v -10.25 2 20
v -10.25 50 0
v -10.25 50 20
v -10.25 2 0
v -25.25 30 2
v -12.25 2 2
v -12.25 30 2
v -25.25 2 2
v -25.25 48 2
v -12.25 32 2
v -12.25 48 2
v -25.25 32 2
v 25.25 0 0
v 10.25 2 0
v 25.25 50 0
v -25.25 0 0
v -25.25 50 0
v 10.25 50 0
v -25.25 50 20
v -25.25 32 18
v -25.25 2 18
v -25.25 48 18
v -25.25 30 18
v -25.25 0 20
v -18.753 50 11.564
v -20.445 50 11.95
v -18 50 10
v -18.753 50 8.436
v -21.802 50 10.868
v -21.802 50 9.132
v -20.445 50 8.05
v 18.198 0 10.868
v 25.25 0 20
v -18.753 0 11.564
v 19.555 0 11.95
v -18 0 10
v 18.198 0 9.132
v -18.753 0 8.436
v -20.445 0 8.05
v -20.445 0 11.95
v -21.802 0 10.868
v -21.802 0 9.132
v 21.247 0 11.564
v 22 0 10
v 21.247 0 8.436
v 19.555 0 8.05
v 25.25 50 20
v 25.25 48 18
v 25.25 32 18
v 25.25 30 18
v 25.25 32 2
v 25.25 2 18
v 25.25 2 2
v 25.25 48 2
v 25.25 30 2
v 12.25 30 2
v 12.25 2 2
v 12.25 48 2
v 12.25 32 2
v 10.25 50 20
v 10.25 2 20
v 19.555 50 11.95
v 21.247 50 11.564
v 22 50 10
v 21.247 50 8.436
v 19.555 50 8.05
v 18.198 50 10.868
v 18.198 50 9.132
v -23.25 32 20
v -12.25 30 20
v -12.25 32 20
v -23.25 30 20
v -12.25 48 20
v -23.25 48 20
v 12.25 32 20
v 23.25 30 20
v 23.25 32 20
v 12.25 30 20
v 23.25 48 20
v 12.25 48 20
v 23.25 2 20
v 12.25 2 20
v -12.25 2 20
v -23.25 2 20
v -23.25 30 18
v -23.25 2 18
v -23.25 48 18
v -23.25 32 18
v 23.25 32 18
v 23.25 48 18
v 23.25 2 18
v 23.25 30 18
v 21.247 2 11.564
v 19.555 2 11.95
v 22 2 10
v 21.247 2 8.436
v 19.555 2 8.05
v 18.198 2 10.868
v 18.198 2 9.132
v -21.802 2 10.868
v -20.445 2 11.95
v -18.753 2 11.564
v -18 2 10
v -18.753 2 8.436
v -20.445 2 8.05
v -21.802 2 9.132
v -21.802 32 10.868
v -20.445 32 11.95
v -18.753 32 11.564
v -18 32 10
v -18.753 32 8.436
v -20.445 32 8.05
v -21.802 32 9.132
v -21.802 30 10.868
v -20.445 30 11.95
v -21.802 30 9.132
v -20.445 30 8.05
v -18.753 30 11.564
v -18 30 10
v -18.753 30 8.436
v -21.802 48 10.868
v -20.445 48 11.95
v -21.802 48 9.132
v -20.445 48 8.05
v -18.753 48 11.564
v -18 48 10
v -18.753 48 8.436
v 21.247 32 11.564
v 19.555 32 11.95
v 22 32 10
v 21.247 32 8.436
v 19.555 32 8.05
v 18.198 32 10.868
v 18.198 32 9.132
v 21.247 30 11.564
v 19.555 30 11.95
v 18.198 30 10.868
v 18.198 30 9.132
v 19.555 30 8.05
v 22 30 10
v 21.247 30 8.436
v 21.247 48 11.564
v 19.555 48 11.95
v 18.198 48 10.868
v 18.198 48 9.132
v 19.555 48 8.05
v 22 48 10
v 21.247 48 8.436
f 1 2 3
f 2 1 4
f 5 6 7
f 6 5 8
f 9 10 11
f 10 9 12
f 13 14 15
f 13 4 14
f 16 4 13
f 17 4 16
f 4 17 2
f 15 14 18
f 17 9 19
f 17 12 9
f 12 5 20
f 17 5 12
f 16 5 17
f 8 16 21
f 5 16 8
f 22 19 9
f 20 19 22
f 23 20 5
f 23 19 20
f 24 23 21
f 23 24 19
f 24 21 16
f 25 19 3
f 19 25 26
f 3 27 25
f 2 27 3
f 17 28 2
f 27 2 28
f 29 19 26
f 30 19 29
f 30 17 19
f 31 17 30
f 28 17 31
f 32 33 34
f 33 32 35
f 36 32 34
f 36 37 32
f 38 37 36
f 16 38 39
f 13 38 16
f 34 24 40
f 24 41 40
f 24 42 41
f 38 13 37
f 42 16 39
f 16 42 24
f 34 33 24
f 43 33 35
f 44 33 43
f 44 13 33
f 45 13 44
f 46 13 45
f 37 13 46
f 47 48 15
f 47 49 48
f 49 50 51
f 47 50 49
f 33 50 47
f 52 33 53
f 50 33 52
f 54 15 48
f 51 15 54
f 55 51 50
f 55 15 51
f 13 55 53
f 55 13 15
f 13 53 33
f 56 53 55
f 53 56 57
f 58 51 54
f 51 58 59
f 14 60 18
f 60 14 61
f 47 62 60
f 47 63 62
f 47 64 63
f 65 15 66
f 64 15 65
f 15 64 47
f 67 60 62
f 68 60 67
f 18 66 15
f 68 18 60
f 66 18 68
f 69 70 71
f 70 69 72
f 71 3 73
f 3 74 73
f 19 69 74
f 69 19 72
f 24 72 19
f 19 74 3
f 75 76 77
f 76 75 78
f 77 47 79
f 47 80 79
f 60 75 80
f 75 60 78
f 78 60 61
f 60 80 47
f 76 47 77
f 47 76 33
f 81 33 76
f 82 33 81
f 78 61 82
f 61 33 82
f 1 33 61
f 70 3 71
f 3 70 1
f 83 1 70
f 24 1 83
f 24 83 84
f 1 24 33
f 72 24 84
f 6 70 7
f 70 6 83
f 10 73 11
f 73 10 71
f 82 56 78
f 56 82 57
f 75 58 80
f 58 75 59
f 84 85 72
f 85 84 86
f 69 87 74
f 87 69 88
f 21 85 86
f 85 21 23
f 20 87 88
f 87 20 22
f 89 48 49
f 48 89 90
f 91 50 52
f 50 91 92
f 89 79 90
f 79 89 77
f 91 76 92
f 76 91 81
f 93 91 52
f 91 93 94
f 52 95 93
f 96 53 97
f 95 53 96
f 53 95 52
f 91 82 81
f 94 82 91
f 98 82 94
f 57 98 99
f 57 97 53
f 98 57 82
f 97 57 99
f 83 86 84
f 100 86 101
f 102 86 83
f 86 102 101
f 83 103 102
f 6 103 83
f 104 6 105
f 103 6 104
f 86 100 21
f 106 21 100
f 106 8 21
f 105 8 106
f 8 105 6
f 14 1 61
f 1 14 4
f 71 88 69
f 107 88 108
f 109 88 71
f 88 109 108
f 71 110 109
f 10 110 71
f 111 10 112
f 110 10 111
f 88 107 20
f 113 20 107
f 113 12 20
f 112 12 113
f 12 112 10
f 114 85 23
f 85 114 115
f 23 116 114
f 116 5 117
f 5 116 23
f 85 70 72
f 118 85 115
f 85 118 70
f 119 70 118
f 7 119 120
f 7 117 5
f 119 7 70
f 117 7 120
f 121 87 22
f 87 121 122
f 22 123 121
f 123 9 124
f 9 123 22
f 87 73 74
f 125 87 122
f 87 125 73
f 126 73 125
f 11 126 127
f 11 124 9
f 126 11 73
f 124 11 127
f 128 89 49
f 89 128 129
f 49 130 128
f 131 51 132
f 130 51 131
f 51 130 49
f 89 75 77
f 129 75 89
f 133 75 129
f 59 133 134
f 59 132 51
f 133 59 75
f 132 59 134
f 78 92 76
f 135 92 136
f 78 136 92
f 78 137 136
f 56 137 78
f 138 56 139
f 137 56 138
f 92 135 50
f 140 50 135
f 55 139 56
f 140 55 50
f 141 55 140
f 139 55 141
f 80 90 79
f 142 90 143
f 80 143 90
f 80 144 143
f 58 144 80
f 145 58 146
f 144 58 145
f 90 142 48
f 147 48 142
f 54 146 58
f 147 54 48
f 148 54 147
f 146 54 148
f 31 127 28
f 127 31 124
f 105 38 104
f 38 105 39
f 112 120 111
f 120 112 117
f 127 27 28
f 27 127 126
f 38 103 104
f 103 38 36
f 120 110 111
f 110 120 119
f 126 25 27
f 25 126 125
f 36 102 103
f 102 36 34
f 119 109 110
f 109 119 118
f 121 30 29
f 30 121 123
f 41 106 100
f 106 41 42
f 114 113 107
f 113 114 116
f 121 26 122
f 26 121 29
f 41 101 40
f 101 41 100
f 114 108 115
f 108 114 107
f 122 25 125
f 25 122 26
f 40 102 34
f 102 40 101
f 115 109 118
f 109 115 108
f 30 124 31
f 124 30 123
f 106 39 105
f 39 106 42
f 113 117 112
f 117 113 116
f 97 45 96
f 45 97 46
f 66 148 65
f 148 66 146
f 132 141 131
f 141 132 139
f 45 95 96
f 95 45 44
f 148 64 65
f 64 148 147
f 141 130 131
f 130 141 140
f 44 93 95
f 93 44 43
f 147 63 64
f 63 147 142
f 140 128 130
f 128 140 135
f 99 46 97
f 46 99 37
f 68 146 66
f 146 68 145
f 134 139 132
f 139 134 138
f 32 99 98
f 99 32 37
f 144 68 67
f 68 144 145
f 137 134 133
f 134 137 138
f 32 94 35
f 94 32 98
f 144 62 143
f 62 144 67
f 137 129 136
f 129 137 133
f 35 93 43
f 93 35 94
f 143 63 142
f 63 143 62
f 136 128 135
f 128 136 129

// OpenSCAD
// bracket for servo - v0.2
pth = 2.0; // plate thikness
he = 46.0;
wz = 20.0;
xw = 20.5; /* 20.5 */ xw2 = xw/2;
rh = 2.0;
xb = 13;

x_all = xw + 2 * xb + 2 * pth;
x_all2 = x_all /2;

t_scale = 1.025;

module servo_brack()
{
  difference() {
    union() {
      // low panes
      translate([-xw2-pth-xb,0,0])  cube( [xb+pth, he+2*pth, pth ] );
      translate([ xw2       ,0,0])  cube( [xb+pth, he+2*pth, pth ] );
      // high panes

      // Y-oriented panes
      translate([-xw2-pth,0,0])   cube([pth,he+2*pth,wz]);
      translate([ xw2    ,0,0])   cube([pth,he+2*pth,wz]);
      translate([-xw2-xb-pth ,0,wz-pth])   cube([pth,he+2*pth,pth]);
      translate([ xw2+xb     ,0,wz-pth])   cube([pth,he+2*pth,pth]);
      //translate([20+xw+pth,0,0])   cube([pth,he+2*pth,wz]);

      // x-orienred panes
      translate([-x_all2,0,0])      cube([x_all,pth,wz]);
      translate([-x_all2,30,0])     cube([xb+pth,pth,wz]);
      translate([-x_all2,he+pth,0]) cube([xb+pth,pth,wz]);
      translate([xw2    ,30,0])     cube([xb+pth,pth,wz]);
      translate([xw2    ,he+pth,0]) cube([xb+pth,pth,wz]);
    }{
      // holes
      translate([-20, -1,wz/2]) rotate([-90,0,0]) cylinder(r=rh,h=1.2*he);
      translate([ 20, -1,wz/2]) rotate([-90,0,0]) cylinder(r=rh,h=1.2*he);
    }
  }
}

//scale(t_scale)
servo_brack();

echo( x_all );
